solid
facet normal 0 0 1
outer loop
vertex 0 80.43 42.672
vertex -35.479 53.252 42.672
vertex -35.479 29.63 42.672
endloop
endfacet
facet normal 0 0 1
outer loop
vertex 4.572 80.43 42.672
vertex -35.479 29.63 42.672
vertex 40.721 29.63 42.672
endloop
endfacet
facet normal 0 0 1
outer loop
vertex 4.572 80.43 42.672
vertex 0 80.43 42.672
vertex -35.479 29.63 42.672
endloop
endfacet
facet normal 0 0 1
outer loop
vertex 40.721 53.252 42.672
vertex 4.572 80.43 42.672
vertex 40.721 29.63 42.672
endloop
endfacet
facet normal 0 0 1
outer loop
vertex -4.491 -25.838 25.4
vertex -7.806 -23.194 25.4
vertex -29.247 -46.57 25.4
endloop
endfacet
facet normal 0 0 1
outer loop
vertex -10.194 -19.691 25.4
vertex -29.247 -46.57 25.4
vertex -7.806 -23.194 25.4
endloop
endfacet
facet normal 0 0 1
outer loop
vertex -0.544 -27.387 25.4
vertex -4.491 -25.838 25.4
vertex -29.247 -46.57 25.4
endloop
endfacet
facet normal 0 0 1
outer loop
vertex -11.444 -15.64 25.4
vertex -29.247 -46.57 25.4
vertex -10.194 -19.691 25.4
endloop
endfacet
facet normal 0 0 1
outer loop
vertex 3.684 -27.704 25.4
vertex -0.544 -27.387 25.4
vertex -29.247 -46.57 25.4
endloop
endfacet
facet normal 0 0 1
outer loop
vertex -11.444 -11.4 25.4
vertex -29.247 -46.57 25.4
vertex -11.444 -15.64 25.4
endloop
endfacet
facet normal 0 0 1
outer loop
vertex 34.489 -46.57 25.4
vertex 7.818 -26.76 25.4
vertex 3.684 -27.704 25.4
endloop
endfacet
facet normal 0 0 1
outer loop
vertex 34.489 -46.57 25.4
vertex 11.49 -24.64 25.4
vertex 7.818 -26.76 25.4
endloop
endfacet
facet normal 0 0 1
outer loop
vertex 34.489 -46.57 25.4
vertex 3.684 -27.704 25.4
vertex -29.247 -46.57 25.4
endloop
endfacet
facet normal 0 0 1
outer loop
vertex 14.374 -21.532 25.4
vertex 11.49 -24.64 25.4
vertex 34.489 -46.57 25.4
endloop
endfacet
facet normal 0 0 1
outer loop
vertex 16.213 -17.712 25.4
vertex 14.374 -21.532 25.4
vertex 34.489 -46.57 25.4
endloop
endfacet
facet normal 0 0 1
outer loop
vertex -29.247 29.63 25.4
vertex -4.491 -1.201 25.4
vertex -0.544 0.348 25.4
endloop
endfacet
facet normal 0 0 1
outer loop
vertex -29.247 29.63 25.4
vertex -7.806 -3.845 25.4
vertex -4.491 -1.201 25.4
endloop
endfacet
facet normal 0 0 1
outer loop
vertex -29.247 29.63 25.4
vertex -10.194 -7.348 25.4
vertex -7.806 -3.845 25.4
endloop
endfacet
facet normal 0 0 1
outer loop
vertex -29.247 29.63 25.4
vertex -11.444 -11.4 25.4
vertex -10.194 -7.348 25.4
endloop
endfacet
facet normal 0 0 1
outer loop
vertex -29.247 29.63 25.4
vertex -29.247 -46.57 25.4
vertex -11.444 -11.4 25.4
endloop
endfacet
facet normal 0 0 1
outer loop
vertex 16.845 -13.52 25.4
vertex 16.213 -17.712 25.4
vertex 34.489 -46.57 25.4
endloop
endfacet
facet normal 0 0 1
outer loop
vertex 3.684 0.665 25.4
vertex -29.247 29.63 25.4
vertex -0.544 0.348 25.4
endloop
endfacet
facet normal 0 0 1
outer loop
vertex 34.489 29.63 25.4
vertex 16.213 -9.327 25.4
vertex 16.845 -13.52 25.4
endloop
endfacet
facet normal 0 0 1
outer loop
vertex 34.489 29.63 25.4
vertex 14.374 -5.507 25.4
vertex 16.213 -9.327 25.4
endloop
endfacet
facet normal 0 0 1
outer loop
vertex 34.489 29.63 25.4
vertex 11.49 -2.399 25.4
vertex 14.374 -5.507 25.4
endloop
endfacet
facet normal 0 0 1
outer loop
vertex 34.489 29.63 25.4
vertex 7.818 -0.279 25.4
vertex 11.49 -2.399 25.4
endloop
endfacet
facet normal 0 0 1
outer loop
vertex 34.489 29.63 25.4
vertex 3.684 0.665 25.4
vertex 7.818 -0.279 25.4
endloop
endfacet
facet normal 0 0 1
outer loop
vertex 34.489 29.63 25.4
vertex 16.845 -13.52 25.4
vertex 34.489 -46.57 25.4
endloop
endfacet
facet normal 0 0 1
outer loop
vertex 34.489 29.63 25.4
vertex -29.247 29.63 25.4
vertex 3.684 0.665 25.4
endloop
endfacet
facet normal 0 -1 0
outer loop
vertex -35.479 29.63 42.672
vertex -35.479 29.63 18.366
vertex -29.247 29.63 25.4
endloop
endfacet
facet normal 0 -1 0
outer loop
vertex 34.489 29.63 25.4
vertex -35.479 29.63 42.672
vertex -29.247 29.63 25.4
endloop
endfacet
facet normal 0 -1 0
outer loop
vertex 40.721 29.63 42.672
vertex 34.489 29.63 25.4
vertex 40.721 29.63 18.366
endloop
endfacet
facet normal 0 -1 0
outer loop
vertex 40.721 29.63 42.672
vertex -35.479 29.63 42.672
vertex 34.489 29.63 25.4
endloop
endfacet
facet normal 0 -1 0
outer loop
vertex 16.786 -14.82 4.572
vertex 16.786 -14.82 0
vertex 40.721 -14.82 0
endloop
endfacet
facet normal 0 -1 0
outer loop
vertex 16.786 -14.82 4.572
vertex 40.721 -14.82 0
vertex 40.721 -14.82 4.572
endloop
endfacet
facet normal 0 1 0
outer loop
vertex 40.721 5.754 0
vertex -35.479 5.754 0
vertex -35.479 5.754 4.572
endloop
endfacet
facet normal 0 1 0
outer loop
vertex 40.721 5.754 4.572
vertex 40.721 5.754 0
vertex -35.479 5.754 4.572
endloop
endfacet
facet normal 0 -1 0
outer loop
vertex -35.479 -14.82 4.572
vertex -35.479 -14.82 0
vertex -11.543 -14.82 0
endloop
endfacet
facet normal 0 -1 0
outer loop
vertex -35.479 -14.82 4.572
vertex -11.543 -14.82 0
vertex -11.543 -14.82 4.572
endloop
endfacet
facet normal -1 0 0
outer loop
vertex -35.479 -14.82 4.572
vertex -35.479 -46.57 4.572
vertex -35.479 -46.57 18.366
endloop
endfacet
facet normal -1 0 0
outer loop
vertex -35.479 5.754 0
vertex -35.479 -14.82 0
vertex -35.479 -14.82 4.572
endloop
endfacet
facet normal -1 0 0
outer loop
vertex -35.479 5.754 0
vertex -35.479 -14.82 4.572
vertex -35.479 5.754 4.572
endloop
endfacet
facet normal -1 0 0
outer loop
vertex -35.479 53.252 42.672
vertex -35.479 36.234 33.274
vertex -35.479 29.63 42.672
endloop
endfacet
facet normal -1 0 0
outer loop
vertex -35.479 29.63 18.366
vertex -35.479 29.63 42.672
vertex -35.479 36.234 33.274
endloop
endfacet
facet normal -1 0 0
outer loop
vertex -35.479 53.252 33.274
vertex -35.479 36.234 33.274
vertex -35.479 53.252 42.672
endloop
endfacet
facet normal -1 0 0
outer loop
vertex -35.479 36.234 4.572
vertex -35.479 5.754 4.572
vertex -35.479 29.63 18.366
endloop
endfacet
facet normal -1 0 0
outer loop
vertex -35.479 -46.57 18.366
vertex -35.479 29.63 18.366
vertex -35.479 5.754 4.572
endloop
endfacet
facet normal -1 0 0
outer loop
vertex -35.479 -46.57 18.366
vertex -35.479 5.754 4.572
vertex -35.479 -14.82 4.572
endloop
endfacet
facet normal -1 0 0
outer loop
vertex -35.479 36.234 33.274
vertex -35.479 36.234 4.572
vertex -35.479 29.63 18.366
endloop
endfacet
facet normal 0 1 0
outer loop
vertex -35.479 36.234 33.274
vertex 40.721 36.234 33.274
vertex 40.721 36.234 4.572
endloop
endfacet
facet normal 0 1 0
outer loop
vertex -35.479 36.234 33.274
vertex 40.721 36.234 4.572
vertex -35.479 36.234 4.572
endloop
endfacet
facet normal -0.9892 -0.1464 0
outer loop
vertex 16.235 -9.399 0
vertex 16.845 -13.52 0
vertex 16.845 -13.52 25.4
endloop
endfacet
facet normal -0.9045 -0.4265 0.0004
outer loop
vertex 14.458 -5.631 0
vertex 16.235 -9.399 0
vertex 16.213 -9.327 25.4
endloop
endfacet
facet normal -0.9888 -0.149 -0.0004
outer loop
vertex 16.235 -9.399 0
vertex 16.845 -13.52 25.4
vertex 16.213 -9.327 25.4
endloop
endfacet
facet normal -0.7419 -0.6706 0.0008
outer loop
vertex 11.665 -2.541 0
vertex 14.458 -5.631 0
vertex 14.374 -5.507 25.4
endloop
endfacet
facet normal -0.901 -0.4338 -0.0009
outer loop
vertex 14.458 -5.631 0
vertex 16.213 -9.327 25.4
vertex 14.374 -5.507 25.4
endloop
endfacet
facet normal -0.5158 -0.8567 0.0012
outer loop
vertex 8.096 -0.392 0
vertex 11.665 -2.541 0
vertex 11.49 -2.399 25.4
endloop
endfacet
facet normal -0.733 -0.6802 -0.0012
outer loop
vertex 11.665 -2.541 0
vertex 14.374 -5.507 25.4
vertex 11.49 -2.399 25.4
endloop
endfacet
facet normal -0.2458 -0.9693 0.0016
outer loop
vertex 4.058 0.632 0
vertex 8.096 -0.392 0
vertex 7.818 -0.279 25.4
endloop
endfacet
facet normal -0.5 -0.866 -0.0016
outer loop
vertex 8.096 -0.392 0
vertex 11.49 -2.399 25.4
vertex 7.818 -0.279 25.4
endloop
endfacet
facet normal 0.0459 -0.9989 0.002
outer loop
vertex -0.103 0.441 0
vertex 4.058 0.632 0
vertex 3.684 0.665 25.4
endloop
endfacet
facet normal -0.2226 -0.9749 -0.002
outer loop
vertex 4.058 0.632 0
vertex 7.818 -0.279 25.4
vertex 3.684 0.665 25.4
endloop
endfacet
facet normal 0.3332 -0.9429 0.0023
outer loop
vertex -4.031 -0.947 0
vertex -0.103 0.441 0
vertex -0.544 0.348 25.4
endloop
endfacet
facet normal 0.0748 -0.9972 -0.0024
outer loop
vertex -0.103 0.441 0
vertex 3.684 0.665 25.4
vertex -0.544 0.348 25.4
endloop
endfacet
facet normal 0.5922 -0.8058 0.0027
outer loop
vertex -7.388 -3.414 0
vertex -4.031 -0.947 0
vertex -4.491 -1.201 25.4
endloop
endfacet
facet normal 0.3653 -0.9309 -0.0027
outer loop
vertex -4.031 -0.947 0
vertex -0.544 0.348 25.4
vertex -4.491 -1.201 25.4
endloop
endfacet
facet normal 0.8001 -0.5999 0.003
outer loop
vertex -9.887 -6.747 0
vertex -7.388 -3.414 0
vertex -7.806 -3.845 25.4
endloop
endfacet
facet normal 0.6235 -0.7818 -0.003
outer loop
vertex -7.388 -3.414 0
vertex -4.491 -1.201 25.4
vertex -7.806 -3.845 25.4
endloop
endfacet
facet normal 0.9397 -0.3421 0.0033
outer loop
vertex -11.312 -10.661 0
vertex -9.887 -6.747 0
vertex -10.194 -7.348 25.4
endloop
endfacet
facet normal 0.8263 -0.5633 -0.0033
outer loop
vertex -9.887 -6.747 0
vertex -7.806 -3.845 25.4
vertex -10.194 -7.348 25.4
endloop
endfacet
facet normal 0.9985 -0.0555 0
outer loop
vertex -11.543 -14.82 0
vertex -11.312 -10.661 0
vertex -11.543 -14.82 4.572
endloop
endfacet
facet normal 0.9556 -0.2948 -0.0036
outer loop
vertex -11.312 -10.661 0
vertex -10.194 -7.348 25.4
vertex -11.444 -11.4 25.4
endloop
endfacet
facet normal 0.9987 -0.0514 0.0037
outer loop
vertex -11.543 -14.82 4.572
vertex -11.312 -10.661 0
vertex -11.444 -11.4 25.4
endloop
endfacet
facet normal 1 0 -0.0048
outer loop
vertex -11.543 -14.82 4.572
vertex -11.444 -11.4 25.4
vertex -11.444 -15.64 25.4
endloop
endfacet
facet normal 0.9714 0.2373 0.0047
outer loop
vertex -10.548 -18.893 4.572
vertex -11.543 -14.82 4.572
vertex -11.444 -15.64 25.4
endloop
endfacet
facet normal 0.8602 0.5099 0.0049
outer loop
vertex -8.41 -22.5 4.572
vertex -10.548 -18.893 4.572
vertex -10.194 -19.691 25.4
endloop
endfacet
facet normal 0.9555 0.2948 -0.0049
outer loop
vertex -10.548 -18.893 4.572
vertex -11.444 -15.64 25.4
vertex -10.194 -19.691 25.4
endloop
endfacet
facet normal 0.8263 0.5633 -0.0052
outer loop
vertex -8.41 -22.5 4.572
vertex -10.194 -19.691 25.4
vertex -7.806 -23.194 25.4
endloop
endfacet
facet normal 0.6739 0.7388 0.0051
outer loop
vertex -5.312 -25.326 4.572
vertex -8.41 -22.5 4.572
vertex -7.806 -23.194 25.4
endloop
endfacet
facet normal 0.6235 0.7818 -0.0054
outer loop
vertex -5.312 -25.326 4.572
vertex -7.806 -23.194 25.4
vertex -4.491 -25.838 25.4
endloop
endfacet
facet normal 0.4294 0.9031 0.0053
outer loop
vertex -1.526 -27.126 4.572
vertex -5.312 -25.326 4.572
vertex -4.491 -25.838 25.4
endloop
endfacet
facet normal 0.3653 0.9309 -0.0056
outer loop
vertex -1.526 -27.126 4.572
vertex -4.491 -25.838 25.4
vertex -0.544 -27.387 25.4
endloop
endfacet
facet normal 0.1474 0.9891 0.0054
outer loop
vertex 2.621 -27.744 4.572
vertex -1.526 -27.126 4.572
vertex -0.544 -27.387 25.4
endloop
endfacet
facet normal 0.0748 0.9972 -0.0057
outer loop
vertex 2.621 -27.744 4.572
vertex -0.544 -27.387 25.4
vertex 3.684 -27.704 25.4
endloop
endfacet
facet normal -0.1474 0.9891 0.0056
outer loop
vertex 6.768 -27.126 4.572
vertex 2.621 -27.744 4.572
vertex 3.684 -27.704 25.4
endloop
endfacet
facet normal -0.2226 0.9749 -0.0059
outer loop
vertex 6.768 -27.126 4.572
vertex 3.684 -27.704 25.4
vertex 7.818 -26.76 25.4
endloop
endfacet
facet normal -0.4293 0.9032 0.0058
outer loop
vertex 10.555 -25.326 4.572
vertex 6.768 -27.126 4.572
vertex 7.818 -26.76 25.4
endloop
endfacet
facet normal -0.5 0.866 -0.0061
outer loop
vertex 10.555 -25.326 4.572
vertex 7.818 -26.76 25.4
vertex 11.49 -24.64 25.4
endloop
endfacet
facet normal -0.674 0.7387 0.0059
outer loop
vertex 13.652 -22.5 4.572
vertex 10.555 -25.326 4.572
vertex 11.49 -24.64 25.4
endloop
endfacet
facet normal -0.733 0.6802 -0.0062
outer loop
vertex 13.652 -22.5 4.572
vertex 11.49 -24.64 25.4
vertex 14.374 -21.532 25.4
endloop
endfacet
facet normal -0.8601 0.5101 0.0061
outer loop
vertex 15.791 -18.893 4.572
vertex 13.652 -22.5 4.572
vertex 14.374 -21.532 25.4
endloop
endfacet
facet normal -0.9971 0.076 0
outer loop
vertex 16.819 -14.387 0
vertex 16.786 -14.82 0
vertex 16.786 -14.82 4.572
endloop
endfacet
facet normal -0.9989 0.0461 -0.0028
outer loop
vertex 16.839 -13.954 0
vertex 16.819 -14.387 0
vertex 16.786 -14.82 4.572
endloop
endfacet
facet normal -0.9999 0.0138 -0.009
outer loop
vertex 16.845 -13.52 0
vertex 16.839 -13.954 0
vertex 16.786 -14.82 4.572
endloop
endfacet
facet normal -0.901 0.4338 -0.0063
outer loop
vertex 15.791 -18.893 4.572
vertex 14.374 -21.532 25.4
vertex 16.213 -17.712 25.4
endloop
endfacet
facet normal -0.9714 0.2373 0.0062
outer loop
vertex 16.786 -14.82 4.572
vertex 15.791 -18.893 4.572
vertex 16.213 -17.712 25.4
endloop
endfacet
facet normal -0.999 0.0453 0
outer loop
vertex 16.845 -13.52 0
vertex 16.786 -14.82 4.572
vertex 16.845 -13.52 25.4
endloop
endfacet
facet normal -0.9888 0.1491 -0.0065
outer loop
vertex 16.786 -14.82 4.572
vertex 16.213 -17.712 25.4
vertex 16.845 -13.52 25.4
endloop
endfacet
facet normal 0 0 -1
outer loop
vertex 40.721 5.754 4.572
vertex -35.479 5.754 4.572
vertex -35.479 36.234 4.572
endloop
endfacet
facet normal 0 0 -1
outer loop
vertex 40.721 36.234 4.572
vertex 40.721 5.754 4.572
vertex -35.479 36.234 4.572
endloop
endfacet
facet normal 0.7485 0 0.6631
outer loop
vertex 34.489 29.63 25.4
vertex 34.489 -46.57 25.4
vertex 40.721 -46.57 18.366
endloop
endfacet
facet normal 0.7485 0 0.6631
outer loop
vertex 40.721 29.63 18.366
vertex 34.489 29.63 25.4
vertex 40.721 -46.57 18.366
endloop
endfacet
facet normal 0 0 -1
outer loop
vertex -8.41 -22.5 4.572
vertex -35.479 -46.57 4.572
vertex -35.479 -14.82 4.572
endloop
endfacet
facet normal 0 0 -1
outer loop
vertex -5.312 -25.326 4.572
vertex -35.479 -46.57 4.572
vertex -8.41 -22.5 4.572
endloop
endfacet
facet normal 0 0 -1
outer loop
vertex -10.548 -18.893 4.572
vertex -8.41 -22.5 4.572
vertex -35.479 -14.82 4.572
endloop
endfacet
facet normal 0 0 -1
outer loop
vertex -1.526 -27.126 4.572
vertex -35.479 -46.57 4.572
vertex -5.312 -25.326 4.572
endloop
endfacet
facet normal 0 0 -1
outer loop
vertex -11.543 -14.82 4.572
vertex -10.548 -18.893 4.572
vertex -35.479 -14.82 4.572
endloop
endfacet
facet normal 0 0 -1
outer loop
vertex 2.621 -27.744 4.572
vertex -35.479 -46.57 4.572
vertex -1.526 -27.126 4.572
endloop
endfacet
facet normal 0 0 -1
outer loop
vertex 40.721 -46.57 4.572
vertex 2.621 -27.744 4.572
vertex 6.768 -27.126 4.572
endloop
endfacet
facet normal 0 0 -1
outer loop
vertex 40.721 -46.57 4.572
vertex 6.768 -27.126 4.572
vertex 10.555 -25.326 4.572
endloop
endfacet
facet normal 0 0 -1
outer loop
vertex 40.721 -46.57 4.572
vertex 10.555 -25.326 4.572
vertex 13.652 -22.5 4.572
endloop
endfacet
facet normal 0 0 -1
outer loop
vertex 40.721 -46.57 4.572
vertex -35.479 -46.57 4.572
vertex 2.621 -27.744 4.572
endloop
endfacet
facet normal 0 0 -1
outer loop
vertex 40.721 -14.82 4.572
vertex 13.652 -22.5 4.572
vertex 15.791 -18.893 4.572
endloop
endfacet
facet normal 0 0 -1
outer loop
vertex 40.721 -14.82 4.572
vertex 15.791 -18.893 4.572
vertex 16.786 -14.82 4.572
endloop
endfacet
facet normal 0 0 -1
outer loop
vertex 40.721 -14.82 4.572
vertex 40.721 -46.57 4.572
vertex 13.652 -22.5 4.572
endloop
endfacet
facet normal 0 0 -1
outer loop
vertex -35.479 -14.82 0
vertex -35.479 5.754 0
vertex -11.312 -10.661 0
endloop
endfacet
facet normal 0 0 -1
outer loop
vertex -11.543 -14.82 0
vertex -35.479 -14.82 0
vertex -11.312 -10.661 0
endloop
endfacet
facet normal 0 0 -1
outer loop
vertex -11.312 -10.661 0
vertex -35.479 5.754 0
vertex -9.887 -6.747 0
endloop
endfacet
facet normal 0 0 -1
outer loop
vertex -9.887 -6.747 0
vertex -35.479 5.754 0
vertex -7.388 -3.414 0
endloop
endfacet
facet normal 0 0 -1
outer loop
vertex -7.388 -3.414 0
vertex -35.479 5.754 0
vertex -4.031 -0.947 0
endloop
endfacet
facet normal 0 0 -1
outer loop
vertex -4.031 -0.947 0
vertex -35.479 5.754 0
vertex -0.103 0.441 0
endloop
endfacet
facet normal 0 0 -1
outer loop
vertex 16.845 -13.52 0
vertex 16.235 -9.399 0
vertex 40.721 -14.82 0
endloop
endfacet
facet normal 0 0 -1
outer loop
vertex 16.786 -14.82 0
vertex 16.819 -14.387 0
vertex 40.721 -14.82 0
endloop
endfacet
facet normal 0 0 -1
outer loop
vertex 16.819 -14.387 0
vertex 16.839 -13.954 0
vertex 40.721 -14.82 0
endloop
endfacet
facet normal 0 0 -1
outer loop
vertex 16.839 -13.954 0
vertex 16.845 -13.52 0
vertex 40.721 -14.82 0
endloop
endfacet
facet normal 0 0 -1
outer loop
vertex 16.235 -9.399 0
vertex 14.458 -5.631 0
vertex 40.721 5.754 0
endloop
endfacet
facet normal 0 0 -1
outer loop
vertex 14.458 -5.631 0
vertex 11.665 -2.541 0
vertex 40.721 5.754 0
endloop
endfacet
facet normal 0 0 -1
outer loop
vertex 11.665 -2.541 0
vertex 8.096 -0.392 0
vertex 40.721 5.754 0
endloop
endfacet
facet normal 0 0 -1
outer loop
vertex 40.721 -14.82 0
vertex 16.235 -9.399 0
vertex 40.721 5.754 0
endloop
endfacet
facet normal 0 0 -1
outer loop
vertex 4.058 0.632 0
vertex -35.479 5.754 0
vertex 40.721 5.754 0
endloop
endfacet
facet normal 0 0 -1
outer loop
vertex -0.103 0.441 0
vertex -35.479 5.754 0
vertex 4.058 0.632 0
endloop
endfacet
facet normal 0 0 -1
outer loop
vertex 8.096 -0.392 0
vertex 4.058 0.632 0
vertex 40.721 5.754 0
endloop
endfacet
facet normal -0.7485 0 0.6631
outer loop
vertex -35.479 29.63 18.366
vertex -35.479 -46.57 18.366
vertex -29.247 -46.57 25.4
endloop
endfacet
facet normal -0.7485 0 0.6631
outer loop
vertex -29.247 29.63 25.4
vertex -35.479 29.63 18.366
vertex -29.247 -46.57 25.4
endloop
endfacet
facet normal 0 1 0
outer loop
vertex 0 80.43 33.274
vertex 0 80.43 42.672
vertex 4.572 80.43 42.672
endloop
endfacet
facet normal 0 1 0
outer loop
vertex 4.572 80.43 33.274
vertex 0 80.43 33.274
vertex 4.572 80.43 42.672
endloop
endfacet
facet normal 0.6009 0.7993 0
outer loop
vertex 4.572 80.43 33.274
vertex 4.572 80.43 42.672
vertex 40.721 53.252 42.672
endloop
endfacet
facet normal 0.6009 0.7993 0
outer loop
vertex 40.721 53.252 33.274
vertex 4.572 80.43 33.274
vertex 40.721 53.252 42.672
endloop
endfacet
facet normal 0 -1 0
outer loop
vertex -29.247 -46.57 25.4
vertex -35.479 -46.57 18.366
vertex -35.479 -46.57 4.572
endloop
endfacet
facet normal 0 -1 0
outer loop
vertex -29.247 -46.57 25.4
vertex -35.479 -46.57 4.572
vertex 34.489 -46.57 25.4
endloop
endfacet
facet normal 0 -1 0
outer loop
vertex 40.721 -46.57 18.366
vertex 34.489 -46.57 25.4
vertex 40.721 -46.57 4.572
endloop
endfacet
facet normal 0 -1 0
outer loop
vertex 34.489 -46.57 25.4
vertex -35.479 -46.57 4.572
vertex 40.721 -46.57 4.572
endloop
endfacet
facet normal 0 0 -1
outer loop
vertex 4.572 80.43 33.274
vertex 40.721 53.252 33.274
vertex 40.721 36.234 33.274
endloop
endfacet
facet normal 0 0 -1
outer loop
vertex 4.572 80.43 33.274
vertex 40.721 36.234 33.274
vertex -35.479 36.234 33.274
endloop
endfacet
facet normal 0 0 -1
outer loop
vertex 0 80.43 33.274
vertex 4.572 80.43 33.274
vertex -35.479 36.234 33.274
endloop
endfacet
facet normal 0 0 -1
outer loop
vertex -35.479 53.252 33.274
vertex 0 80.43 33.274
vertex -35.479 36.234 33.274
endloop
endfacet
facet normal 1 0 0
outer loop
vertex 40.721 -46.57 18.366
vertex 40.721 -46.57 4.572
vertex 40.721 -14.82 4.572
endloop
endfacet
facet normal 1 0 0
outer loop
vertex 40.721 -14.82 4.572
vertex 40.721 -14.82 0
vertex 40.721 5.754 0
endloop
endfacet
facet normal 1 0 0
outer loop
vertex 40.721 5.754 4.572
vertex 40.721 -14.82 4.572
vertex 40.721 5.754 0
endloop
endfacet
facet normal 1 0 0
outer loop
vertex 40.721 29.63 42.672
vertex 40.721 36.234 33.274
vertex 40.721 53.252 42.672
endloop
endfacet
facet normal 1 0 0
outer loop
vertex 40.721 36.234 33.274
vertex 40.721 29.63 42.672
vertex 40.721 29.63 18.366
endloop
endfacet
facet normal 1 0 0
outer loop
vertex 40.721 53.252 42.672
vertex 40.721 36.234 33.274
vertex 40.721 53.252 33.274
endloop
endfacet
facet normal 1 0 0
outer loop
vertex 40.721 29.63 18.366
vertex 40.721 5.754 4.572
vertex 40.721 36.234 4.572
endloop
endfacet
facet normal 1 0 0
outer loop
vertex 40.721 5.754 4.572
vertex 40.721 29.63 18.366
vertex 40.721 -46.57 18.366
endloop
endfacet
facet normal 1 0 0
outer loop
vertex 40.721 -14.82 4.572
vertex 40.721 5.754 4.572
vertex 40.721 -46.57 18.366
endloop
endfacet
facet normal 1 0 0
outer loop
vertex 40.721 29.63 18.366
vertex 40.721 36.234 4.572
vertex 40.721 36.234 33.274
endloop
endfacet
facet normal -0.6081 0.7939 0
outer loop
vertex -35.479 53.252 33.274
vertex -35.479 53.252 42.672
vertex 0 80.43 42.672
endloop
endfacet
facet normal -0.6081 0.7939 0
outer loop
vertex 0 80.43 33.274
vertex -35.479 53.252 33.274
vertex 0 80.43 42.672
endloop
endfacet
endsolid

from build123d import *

# Parameters (mm, degrees)
F0_W      = 76.2
F0_H      = 76.2
F1_DEPTH  = 25.4
F0_H_2    = 50.8
F2_DEPTH  = 42.672
F4_DEPTH  = 76.2
F5_R      = 14.224
F6_DEPTH  = 25.4
F7_W      = 31.75
F7_H      = 4.572
F7_W_2    = 74.676
F8_DEPTH  = 96.266
F10_W     = 76.2
F10_H     = 28.702
F11_DEPTH = 44.196
F12_DEPTH = 25.4


with BuildPart() as f1:
    # F0 (on Top) → F1 (new body)
    with BuildSketch(Plane.XY):
        with Locations((2.621409, -8.470273)):
            Rectangle(F0_W, F0_H)
    extrude(amount=F1_DEPTH)

    # F0 (on Top) → F2 (join)
    with BuildSketch(Plane.XY):
        with Locations((2.621409, 55.029727)):
            Rectangle(F0_W, F0_H_2)
    extrude(amount=F2_DEPTH)

    # F3 (on face) → F4 (cut)
    with BuildSketch(Plane.XZ.offset(46.570273)):
        Polygon((40.721409, 25.4), (34.48936, 25.4), (40.721409, 18.365515), align=None)
        Polygon((-35.478591, 18.365515), (-29.246543, 25.4), (-35.478591, 25.4), align=None)
    extrude(amount=-F4_DEPTH, mode=Mode.SUBTRACT)

    # F5 (on face) → F6 (cut)
    with BuildSketch(Plane.XY.offset(25.4)):
        with Locations((2.621409, -13.519656)):
            Circle(F5_R)
    extrude(amount=-F6_DEPTH, mode=Mode.SUBTRACT)

    # F7 (on face) → F8 (cut)
    with BuildSketch(Plane.YZ.offset(40.721409)):
        with Locations((-30.695273, 2.286)):
            Rectangle(F7_W, F7_H)
        with Locations((43.091727, 2.286)):
            Rectangle(F7_W_2, F7_H)
    extrude(amount=-F8_DEPTH, mode=Mode.SUBTRACT)

    # F10 (on face) → F11 (cut)
    with BuildSketch(Plane(origin=(0, 80.429727, 0), x_dir=(-1, 0, 0), z_dir=(0, 1, 0))):
        with Locations((-2.621409, 18.923)):
            Rectangle(F10_W, F10_H)
    extrude(amount=-F11_DEPTH, mode=Mode.SUBTRACT)

    # F9 (on face) → F12 (cut)
    with BuildSketch(Plane.XY.offset(42.672)):
        Polygon((4.572, 80.429727), (40.721409, 53.251727), (40.721409, 80.429727), align=None)
        Polygon((-35.478591, 80.429727), (-35.478591, 53.251727), (0, 80.429727), align=None)
    extrude(amount=-F12_DEPTH, mode=Mode.SUBTRACT)


solid = f1.part
